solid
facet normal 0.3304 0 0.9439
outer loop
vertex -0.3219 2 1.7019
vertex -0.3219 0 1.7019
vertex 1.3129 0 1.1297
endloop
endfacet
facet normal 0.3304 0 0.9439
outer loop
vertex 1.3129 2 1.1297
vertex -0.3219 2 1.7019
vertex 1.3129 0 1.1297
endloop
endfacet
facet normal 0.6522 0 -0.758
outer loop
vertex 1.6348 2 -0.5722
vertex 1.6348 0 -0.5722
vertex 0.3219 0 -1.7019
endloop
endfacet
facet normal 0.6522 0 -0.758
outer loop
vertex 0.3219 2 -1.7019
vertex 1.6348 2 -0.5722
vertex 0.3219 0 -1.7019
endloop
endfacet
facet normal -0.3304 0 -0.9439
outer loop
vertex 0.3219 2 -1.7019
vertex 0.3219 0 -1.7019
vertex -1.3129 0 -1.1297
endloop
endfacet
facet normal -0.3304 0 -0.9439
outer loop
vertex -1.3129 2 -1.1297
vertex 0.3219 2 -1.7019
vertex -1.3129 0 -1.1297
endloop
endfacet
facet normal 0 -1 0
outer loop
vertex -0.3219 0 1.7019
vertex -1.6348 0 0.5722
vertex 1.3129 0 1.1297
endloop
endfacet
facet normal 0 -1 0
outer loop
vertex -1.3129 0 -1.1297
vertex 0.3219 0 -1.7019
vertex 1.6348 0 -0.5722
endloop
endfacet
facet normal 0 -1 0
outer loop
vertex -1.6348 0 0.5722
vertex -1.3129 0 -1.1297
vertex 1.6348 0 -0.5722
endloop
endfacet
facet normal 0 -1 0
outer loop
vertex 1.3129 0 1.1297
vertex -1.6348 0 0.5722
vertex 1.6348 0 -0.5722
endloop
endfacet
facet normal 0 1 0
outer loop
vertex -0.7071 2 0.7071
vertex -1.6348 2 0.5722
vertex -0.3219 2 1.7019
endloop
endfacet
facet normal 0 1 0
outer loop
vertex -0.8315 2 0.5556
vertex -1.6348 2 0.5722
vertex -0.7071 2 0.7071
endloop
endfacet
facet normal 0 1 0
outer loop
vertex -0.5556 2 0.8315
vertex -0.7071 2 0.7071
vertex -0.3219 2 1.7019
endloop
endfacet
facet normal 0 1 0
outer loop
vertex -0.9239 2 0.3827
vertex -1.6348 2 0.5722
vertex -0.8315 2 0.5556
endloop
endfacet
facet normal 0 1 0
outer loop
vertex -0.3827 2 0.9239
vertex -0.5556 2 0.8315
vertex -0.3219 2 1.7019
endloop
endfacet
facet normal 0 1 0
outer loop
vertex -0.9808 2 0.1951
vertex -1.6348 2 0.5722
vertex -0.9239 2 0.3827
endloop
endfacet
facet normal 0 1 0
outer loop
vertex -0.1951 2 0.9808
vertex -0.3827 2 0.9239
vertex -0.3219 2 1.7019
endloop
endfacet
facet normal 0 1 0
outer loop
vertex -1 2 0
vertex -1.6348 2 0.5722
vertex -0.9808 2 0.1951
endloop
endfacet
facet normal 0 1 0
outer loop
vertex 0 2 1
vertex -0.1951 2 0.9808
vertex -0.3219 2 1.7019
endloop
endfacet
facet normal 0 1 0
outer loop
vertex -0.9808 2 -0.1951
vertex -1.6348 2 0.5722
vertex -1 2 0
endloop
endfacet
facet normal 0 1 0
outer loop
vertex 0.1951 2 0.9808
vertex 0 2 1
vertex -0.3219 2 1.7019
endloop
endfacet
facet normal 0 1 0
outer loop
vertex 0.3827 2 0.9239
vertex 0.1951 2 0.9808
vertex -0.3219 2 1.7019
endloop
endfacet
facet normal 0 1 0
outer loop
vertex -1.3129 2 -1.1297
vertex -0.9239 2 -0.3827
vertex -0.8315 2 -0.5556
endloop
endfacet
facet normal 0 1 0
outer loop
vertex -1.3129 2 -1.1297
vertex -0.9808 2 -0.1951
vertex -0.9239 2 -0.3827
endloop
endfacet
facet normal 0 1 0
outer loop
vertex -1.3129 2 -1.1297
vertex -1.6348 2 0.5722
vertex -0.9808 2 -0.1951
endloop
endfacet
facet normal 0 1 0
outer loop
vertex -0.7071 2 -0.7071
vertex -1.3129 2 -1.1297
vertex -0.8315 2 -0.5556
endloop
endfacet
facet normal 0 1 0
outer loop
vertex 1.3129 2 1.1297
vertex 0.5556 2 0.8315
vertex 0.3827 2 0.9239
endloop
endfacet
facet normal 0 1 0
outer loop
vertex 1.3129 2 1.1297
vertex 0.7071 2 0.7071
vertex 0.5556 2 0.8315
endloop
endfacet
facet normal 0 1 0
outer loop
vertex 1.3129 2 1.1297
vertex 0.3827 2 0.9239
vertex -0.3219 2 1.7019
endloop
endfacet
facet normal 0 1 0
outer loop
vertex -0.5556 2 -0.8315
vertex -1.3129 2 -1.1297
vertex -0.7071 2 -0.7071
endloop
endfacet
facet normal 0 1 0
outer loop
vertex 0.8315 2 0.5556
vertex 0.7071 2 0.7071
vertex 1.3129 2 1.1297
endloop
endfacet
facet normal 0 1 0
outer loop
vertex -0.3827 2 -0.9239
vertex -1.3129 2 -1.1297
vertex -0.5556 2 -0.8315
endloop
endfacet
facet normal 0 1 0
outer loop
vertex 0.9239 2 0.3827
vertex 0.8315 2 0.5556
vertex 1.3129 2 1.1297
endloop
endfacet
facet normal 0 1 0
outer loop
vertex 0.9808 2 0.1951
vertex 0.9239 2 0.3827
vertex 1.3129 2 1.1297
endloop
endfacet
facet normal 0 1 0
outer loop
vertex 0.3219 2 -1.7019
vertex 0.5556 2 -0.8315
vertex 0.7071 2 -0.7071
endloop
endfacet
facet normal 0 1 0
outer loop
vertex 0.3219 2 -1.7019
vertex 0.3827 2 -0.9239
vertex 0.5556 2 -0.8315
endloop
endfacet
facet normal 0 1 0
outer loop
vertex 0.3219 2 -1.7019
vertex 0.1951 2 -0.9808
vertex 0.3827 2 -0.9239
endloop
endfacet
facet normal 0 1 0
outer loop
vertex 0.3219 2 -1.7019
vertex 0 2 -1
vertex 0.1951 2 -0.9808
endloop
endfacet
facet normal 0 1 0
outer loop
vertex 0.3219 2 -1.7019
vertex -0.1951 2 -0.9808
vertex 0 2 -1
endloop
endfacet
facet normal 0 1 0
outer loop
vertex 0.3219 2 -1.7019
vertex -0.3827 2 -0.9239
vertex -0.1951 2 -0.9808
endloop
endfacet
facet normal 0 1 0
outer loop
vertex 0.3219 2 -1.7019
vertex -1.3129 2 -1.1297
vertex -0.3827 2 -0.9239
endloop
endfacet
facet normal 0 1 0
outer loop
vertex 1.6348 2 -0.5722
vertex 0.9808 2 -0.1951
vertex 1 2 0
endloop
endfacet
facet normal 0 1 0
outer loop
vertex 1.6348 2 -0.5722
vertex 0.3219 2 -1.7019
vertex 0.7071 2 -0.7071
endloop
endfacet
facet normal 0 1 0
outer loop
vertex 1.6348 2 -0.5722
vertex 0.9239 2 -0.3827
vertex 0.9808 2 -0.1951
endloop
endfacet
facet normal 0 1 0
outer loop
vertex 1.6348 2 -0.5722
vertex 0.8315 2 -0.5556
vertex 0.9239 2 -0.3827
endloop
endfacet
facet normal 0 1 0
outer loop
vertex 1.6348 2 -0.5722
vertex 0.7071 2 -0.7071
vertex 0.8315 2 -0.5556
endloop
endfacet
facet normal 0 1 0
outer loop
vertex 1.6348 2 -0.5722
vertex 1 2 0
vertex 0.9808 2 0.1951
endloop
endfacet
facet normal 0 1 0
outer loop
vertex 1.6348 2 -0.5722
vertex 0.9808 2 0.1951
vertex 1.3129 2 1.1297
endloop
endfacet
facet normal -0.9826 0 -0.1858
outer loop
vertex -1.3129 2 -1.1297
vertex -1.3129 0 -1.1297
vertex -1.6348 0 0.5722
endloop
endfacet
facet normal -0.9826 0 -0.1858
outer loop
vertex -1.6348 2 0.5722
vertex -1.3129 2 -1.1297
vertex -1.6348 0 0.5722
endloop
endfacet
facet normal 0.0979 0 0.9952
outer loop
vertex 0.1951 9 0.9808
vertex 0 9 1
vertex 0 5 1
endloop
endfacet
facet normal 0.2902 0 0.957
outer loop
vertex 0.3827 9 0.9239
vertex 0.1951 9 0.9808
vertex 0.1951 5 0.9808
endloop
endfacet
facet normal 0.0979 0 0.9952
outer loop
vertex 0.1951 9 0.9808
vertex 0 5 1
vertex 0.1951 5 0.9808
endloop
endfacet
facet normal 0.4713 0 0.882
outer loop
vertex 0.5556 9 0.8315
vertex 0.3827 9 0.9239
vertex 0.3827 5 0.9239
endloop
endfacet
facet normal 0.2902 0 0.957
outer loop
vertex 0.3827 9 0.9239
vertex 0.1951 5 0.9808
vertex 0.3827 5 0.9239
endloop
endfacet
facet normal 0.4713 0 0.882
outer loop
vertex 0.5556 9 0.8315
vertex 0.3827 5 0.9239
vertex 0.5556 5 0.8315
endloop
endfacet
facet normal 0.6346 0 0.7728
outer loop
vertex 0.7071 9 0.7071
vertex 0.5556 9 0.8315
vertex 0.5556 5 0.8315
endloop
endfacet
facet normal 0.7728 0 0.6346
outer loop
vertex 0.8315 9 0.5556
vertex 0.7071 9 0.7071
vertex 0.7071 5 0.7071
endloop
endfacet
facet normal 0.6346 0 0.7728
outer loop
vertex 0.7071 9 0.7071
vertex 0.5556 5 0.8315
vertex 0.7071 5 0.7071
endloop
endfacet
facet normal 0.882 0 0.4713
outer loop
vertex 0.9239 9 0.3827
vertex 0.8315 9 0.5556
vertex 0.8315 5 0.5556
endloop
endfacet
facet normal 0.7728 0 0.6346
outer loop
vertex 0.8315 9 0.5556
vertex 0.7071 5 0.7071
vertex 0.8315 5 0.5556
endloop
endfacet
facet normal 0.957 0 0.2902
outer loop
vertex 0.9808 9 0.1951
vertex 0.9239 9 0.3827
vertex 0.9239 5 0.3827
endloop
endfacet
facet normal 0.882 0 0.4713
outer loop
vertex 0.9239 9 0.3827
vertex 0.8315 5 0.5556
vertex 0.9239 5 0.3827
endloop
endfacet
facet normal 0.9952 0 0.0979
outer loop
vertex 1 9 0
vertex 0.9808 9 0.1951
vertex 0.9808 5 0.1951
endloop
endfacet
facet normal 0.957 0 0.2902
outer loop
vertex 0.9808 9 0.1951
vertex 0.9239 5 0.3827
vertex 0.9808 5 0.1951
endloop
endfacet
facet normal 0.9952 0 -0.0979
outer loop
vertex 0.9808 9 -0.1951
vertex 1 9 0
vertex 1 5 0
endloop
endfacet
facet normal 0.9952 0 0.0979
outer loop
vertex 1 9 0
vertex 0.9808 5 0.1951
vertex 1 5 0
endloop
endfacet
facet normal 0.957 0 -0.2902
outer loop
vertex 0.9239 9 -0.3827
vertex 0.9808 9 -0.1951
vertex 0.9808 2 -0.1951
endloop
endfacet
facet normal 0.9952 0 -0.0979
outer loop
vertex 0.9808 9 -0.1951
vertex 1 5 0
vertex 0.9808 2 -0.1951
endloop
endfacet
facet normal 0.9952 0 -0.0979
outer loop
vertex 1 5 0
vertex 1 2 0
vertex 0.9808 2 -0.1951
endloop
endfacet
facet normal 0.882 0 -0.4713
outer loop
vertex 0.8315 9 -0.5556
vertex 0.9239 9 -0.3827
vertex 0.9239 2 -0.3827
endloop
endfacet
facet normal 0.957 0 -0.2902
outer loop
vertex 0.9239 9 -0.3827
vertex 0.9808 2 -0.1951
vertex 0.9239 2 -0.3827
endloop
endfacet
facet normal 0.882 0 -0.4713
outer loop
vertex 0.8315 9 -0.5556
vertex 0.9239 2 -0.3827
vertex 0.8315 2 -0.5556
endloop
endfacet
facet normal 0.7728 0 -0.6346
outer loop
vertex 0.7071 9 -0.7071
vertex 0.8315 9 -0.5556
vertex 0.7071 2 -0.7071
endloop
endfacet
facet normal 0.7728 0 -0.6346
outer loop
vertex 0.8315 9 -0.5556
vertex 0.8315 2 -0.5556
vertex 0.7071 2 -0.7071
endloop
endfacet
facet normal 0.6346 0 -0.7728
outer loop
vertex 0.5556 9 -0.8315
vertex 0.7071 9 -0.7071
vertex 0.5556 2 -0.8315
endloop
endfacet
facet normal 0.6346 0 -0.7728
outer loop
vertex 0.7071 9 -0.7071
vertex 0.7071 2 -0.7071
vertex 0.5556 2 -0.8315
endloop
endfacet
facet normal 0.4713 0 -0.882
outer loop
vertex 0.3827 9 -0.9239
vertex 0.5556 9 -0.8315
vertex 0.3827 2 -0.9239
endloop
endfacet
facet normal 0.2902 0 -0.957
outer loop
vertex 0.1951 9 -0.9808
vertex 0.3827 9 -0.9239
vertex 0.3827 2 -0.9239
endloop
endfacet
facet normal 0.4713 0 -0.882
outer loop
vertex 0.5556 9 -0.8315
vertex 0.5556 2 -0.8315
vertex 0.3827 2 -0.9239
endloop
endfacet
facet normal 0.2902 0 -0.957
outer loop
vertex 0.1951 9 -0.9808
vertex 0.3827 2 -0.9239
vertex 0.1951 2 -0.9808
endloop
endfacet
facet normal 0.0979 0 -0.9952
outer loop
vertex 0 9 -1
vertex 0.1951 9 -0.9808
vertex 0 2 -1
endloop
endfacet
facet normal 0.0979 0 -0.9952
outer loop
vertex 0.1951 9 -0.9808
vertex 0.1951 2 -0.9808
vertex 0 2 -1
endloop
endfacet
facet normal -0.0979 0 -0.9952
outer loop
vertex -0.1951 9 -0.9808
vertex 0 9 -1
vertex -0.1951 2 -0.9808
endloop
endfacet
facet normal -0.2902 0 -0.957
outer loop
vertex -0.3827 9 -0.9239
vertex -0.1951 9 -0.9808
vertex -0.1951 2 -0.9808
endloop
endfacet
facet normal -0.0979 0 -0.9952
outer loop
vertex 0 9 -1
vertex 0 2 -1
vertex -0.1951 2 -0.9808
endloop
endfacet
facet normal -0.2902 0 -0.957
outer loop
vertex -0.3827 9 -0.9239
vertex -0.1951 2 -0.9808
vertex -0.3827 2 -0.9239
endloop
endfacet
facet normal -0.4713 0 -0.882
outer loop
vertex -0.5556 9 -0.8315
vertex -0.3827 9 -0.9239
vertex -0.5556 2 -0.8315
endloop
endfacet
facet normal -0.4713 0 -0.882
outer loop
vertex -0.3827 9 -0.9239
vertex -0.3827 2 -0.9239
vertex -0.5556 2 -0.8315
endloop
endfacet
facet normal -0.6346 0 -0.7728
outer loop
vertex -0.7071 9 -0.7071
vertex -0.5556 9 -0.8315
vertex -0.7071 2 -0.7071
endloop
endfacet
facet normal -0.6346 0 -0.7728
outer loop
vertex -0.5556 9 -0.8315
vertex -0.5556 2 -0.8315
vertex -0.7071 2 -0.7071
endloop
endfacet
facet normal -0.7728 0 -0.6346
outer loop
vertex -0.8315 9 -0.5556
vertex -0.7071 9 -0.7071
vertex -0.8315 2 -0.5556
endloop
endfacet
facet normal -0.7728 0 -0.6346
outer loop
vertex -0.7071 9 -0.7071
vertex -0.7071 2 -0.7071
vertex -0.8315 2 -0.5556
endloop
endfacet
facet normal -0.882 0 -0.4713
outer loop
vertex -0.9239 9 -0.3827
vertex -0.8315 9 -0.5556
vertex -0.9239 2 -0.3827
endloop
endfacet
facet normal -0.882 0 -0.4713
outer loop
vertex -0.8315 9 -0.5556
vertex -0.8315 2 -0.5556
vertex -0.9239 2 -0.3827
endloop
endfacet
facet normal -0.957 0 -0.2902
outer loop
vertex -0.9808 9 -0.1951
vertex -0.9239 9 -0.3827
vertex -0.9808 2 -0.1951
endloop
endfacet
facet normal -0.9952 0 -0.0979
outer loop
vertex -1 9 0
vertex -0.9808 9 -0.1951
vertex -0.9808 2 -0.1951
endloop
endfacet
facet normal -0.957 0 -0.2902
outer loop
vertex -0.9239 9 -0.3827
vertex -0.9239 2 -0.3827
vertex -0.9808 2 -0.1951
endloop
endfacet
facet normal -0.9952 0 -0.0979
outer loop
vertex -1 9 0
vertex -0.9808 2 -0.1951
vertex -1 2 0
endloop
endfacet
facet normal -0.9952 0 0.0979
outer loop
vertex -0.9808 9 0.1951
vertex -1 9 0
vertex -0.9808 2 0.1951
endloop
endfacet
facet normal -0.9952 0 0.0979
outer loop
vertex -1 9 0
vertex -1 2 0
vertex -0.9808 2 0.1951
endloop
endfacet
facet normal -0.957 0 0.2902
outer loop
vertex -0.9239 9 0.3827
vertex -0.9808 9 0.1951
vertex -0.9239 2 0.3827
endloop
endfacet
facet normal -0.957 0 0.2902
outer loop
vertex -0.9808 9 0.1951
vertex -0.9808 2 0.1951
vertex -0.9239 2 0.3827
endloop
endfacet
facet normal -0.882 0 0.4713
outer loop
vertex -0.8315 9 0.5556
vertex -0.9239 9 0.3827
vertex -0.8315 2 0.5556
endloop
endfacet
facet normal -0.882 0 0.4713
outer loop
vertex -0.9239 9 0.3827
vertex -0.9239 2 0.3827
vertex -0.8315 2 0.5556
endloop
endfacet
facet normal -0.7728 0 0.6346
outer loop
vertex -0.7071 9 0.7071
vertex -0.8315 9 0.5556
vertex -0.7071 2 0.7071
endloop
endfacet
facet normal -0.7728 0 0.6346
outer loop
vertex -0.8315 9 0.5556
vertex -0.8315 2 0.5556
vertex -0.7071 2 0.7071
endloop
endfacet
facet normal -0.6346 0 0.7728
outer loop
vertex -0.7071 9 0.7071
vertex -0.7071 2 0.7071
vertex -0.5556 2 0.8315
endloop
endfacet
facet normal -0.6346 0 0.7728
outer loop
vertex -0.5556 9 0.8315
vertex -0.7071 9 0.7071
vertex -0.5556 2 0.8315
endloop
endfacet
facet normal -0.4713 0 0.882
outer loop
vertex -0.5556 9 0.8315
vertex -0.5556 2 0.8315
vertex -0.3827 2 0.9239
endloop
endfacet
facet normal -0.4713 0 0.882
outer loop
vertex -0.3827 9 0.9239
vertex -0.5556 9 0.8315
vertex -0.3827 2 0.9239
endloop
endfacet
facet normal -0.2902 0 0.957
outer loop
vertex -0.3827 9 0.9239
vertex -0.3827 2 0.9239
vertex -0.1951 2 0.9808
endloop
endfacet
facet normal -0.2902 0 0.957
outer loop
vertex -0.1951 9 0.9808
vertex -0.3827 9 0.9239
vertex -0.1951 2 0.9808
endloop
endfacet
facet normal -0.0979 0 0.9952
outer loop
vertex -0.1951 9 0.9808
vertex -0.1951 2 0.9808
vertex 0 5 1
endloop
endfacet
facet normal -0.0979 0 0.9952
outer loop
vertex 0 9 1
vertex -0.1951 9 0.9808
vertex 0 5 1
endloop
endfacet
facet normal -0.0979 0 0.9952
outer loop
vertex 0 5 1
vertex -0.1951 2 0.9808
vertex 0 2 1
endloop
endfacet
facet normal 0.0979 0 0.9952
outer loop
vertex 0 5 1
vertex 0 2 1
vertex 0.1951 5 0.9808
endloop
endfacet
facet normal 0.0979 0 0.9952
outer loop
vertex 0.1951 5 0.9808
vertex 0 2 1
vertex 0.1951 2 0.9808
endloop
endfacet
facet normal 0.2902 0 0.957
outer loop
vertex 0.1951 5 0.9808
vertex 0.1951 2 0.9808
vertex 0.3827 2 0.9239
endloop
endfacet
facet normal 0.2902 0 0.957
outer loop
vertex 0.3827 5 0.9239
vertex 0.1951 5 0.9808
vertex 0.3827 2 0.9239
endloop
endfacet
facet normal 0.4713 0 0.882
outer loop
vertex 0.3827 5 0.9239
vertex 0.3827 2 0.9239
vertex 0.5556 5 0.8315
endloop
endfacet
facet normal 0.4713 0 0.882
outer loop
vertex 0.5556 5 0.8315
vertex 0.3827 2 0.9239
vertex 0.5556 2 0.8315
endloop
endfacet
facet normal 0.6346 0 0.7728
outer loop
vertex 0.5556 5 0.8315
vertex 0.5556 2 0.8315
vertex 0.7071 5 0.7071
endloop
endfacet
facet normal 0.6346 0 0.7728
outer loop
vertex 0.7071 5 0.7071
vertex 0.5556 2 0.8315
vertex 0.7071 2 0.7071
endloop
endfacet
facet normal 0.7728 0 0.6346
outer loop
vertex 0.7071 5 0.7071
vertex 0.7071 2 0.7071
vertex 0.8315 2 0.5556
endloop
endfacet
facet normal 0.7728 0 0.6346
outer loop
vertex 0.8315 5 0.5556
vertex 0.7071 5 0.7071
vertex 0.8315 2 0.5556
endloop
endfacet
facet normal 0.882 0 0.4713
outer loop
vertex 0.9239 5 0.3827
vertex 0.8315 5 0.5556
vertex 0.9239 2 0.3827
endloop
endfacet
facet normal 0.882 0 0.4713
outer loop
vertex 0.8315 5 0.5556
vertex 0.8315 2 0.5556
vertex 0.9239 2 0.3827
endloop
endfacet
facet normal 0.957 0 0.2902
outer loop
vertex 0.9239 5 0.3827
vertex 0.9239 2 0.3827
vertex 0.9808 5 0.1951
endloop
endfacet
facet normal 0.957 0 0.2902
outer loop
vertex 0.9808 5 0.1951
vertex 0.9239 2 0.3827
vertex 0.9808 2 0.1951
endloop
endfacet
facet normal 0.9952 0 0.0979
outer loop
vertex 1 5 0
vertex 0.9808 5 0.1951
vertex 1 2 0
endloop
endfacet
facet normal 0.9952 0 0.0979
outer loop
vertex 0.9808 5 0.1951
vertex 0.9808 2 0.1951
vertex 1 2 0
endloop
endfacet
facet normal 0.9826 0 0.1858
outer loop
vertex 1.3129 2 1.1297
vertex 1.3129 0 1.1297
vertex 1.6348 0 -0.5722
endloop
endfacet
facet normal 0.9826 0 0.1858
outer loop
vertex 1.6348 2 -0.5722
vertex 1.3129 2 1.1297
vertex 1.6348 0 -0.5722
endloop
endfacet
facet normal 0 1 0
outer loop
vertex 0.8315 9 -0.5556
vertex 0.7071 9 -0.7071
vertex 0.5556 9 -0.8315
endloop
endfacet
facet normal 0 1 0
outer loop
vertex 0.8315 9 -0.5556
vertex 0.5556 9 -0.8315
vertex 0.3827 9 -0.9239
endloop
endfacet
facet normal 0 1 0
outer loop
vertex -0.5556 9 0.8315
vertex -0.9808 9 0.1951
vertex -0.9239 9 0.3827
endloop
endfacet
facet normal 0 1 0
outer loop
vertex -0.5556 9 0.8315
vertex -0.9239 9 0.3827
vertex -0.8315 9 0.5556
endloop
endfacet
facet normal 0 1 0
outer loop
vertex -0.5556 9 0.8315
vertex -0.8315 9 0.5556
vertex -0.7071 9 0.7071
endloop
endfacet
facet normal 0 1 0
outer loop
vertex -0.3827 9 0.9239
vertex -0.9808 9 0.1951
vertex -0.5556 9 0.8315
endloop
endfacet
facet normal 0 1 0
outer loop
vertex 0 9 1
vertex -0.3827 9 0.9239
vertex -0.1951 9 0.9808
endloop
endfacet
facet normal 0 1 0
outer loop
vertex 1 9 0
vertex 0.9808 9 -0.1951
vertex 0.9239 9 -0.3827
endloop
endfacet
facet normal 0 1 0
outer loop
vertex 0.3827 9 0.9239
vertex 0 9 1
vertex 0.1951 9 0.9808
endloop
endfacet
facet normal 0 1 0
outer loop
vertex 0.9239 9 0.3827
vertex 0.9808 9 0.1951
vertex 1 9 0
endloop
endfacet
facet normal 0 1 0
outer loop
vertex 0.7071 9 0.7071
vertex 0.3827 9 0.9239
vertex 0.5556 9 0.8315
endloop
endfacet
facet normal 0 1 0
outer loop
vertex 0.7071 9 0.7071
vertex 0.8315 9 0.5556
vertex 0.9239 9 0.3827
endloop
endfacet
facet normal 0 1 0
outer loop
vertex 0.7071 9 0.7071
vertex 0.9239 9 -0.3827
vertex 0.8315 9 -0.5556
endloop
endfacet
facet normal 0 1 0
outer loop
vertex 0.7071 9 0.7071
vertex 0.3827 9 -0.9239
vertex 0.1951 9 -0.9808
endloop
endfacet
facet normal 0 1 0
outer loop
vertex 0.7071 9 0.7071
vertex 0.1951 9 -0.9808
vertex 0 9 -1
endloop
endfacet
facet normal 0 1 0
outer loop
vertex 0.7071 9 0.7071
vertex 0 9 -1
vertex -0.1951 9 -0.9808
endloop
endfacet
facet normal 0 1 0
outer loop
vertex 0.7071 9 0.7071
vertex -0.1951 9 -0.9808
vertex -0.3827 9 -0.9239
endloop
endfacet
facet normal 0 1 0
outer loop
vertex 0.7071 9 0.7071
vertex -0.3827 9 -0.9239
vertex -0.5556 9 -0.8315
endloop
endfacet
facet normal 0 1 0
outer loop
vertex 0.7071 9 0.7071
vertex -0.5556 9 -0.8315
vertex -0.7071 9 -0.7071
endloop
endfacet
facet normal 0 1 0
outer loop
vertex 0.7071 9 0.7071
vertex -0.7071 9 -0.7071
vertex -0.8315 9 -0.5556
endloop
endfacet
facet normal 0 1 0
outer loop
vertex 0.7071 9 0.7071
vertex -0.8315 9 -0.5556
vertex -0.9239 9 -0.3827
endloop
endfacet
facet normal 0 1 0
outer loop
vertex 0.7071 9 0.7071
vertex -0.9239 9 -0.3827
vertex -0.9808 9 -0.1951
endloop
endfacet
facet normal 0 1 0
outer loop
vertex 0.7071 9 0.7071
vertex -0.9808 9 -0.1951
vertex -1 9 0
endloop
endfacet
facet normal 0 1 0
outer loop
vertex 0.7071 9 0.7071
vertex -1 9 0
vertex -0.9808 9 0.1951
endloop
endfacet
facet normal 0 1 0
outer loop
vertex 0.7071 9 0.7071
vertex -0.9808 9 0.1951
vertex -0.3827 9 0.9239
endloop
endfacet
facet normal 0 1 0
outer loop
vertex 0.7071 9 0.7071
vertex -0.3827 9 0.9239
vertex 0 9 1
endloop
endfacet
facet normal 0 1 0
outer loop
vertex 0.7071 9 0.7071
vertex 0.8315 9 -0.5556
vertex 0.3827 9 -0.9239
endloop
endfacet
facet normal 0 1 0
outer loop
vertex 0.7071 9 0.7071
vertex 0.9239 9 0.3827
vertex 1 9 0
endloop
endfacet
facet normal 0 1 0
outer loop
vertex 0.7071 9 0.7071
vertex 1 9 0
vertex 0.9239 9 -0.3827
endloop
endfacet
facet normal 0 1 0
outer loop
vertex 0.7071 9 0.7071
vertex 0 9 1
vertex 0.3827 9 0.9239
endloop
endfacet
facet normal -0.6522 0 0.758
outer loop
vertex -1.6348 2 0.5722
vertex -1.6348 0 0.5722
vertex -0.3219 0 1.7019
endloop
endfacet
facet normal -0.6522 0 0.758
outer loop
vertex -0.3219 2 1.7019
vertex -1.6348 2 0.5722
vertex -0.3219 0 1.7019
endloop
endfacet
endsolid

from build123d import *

# Parameters (mm, degrees)
OTHER_M2_OUTLINE_R   = 1
OTHER_M2_DEPTH       = 5
OTHER_M2_2_OUTLINE_R = 1
OTHER_M2_2_DEPTH     = 2
SKETCH_2_R           = 1
EXTRUDE_1_DEPTH      = 4


# Read off the part's stored shape, not the designer's step: M2螺栓镜向
with BuildPart() as part:
    # Other M2 outline → Other M2 (new body)
    with BuildSketch(Plane(origin=(0, 0, 0), x_dir=(1, 0, 0), z_dir=(0, 1, 0))):
        Circle(OTHER_M2_OUTLINE_R)
    extrude(amount=OTHER_M2_DEPTH)

    # Other M2 2 outline → Other M2 2 (add)
    with BuildSketch(Plane(origin=(0, 0, 0), x_dir=(1, 0, 0), z_dir=(0, 1, 0))):
        Polygon((1.634810628, 0.57218372), (0.321879677, 1.701879395), (-1.312930951, 1.129695675), (-1.634810628, -0.57218372), (-0.321879677, -1.701879395), (1.312930951, -1.129695675), align=None)
        Circle(OTHER_M2_2_OUTLINE_R, mode=Mode.SUBTRACT)
    extrude(amount=OTHER_M2_2_DEPTH)

    # 草图2 → 凸台-拉伸1 (add)
    with BuildSketch(Plane(origin=(0, 5, 0), x_dir=(1, 0, 0), z_dir=(0, 1, 0))):
        with Locations(Location((0, 0, 0), (0, 0, 270))):
            Circle(SKETCH_2_R)
    extrude(amount=EXTRUDE_1_DEPTH)


solid = part.part
